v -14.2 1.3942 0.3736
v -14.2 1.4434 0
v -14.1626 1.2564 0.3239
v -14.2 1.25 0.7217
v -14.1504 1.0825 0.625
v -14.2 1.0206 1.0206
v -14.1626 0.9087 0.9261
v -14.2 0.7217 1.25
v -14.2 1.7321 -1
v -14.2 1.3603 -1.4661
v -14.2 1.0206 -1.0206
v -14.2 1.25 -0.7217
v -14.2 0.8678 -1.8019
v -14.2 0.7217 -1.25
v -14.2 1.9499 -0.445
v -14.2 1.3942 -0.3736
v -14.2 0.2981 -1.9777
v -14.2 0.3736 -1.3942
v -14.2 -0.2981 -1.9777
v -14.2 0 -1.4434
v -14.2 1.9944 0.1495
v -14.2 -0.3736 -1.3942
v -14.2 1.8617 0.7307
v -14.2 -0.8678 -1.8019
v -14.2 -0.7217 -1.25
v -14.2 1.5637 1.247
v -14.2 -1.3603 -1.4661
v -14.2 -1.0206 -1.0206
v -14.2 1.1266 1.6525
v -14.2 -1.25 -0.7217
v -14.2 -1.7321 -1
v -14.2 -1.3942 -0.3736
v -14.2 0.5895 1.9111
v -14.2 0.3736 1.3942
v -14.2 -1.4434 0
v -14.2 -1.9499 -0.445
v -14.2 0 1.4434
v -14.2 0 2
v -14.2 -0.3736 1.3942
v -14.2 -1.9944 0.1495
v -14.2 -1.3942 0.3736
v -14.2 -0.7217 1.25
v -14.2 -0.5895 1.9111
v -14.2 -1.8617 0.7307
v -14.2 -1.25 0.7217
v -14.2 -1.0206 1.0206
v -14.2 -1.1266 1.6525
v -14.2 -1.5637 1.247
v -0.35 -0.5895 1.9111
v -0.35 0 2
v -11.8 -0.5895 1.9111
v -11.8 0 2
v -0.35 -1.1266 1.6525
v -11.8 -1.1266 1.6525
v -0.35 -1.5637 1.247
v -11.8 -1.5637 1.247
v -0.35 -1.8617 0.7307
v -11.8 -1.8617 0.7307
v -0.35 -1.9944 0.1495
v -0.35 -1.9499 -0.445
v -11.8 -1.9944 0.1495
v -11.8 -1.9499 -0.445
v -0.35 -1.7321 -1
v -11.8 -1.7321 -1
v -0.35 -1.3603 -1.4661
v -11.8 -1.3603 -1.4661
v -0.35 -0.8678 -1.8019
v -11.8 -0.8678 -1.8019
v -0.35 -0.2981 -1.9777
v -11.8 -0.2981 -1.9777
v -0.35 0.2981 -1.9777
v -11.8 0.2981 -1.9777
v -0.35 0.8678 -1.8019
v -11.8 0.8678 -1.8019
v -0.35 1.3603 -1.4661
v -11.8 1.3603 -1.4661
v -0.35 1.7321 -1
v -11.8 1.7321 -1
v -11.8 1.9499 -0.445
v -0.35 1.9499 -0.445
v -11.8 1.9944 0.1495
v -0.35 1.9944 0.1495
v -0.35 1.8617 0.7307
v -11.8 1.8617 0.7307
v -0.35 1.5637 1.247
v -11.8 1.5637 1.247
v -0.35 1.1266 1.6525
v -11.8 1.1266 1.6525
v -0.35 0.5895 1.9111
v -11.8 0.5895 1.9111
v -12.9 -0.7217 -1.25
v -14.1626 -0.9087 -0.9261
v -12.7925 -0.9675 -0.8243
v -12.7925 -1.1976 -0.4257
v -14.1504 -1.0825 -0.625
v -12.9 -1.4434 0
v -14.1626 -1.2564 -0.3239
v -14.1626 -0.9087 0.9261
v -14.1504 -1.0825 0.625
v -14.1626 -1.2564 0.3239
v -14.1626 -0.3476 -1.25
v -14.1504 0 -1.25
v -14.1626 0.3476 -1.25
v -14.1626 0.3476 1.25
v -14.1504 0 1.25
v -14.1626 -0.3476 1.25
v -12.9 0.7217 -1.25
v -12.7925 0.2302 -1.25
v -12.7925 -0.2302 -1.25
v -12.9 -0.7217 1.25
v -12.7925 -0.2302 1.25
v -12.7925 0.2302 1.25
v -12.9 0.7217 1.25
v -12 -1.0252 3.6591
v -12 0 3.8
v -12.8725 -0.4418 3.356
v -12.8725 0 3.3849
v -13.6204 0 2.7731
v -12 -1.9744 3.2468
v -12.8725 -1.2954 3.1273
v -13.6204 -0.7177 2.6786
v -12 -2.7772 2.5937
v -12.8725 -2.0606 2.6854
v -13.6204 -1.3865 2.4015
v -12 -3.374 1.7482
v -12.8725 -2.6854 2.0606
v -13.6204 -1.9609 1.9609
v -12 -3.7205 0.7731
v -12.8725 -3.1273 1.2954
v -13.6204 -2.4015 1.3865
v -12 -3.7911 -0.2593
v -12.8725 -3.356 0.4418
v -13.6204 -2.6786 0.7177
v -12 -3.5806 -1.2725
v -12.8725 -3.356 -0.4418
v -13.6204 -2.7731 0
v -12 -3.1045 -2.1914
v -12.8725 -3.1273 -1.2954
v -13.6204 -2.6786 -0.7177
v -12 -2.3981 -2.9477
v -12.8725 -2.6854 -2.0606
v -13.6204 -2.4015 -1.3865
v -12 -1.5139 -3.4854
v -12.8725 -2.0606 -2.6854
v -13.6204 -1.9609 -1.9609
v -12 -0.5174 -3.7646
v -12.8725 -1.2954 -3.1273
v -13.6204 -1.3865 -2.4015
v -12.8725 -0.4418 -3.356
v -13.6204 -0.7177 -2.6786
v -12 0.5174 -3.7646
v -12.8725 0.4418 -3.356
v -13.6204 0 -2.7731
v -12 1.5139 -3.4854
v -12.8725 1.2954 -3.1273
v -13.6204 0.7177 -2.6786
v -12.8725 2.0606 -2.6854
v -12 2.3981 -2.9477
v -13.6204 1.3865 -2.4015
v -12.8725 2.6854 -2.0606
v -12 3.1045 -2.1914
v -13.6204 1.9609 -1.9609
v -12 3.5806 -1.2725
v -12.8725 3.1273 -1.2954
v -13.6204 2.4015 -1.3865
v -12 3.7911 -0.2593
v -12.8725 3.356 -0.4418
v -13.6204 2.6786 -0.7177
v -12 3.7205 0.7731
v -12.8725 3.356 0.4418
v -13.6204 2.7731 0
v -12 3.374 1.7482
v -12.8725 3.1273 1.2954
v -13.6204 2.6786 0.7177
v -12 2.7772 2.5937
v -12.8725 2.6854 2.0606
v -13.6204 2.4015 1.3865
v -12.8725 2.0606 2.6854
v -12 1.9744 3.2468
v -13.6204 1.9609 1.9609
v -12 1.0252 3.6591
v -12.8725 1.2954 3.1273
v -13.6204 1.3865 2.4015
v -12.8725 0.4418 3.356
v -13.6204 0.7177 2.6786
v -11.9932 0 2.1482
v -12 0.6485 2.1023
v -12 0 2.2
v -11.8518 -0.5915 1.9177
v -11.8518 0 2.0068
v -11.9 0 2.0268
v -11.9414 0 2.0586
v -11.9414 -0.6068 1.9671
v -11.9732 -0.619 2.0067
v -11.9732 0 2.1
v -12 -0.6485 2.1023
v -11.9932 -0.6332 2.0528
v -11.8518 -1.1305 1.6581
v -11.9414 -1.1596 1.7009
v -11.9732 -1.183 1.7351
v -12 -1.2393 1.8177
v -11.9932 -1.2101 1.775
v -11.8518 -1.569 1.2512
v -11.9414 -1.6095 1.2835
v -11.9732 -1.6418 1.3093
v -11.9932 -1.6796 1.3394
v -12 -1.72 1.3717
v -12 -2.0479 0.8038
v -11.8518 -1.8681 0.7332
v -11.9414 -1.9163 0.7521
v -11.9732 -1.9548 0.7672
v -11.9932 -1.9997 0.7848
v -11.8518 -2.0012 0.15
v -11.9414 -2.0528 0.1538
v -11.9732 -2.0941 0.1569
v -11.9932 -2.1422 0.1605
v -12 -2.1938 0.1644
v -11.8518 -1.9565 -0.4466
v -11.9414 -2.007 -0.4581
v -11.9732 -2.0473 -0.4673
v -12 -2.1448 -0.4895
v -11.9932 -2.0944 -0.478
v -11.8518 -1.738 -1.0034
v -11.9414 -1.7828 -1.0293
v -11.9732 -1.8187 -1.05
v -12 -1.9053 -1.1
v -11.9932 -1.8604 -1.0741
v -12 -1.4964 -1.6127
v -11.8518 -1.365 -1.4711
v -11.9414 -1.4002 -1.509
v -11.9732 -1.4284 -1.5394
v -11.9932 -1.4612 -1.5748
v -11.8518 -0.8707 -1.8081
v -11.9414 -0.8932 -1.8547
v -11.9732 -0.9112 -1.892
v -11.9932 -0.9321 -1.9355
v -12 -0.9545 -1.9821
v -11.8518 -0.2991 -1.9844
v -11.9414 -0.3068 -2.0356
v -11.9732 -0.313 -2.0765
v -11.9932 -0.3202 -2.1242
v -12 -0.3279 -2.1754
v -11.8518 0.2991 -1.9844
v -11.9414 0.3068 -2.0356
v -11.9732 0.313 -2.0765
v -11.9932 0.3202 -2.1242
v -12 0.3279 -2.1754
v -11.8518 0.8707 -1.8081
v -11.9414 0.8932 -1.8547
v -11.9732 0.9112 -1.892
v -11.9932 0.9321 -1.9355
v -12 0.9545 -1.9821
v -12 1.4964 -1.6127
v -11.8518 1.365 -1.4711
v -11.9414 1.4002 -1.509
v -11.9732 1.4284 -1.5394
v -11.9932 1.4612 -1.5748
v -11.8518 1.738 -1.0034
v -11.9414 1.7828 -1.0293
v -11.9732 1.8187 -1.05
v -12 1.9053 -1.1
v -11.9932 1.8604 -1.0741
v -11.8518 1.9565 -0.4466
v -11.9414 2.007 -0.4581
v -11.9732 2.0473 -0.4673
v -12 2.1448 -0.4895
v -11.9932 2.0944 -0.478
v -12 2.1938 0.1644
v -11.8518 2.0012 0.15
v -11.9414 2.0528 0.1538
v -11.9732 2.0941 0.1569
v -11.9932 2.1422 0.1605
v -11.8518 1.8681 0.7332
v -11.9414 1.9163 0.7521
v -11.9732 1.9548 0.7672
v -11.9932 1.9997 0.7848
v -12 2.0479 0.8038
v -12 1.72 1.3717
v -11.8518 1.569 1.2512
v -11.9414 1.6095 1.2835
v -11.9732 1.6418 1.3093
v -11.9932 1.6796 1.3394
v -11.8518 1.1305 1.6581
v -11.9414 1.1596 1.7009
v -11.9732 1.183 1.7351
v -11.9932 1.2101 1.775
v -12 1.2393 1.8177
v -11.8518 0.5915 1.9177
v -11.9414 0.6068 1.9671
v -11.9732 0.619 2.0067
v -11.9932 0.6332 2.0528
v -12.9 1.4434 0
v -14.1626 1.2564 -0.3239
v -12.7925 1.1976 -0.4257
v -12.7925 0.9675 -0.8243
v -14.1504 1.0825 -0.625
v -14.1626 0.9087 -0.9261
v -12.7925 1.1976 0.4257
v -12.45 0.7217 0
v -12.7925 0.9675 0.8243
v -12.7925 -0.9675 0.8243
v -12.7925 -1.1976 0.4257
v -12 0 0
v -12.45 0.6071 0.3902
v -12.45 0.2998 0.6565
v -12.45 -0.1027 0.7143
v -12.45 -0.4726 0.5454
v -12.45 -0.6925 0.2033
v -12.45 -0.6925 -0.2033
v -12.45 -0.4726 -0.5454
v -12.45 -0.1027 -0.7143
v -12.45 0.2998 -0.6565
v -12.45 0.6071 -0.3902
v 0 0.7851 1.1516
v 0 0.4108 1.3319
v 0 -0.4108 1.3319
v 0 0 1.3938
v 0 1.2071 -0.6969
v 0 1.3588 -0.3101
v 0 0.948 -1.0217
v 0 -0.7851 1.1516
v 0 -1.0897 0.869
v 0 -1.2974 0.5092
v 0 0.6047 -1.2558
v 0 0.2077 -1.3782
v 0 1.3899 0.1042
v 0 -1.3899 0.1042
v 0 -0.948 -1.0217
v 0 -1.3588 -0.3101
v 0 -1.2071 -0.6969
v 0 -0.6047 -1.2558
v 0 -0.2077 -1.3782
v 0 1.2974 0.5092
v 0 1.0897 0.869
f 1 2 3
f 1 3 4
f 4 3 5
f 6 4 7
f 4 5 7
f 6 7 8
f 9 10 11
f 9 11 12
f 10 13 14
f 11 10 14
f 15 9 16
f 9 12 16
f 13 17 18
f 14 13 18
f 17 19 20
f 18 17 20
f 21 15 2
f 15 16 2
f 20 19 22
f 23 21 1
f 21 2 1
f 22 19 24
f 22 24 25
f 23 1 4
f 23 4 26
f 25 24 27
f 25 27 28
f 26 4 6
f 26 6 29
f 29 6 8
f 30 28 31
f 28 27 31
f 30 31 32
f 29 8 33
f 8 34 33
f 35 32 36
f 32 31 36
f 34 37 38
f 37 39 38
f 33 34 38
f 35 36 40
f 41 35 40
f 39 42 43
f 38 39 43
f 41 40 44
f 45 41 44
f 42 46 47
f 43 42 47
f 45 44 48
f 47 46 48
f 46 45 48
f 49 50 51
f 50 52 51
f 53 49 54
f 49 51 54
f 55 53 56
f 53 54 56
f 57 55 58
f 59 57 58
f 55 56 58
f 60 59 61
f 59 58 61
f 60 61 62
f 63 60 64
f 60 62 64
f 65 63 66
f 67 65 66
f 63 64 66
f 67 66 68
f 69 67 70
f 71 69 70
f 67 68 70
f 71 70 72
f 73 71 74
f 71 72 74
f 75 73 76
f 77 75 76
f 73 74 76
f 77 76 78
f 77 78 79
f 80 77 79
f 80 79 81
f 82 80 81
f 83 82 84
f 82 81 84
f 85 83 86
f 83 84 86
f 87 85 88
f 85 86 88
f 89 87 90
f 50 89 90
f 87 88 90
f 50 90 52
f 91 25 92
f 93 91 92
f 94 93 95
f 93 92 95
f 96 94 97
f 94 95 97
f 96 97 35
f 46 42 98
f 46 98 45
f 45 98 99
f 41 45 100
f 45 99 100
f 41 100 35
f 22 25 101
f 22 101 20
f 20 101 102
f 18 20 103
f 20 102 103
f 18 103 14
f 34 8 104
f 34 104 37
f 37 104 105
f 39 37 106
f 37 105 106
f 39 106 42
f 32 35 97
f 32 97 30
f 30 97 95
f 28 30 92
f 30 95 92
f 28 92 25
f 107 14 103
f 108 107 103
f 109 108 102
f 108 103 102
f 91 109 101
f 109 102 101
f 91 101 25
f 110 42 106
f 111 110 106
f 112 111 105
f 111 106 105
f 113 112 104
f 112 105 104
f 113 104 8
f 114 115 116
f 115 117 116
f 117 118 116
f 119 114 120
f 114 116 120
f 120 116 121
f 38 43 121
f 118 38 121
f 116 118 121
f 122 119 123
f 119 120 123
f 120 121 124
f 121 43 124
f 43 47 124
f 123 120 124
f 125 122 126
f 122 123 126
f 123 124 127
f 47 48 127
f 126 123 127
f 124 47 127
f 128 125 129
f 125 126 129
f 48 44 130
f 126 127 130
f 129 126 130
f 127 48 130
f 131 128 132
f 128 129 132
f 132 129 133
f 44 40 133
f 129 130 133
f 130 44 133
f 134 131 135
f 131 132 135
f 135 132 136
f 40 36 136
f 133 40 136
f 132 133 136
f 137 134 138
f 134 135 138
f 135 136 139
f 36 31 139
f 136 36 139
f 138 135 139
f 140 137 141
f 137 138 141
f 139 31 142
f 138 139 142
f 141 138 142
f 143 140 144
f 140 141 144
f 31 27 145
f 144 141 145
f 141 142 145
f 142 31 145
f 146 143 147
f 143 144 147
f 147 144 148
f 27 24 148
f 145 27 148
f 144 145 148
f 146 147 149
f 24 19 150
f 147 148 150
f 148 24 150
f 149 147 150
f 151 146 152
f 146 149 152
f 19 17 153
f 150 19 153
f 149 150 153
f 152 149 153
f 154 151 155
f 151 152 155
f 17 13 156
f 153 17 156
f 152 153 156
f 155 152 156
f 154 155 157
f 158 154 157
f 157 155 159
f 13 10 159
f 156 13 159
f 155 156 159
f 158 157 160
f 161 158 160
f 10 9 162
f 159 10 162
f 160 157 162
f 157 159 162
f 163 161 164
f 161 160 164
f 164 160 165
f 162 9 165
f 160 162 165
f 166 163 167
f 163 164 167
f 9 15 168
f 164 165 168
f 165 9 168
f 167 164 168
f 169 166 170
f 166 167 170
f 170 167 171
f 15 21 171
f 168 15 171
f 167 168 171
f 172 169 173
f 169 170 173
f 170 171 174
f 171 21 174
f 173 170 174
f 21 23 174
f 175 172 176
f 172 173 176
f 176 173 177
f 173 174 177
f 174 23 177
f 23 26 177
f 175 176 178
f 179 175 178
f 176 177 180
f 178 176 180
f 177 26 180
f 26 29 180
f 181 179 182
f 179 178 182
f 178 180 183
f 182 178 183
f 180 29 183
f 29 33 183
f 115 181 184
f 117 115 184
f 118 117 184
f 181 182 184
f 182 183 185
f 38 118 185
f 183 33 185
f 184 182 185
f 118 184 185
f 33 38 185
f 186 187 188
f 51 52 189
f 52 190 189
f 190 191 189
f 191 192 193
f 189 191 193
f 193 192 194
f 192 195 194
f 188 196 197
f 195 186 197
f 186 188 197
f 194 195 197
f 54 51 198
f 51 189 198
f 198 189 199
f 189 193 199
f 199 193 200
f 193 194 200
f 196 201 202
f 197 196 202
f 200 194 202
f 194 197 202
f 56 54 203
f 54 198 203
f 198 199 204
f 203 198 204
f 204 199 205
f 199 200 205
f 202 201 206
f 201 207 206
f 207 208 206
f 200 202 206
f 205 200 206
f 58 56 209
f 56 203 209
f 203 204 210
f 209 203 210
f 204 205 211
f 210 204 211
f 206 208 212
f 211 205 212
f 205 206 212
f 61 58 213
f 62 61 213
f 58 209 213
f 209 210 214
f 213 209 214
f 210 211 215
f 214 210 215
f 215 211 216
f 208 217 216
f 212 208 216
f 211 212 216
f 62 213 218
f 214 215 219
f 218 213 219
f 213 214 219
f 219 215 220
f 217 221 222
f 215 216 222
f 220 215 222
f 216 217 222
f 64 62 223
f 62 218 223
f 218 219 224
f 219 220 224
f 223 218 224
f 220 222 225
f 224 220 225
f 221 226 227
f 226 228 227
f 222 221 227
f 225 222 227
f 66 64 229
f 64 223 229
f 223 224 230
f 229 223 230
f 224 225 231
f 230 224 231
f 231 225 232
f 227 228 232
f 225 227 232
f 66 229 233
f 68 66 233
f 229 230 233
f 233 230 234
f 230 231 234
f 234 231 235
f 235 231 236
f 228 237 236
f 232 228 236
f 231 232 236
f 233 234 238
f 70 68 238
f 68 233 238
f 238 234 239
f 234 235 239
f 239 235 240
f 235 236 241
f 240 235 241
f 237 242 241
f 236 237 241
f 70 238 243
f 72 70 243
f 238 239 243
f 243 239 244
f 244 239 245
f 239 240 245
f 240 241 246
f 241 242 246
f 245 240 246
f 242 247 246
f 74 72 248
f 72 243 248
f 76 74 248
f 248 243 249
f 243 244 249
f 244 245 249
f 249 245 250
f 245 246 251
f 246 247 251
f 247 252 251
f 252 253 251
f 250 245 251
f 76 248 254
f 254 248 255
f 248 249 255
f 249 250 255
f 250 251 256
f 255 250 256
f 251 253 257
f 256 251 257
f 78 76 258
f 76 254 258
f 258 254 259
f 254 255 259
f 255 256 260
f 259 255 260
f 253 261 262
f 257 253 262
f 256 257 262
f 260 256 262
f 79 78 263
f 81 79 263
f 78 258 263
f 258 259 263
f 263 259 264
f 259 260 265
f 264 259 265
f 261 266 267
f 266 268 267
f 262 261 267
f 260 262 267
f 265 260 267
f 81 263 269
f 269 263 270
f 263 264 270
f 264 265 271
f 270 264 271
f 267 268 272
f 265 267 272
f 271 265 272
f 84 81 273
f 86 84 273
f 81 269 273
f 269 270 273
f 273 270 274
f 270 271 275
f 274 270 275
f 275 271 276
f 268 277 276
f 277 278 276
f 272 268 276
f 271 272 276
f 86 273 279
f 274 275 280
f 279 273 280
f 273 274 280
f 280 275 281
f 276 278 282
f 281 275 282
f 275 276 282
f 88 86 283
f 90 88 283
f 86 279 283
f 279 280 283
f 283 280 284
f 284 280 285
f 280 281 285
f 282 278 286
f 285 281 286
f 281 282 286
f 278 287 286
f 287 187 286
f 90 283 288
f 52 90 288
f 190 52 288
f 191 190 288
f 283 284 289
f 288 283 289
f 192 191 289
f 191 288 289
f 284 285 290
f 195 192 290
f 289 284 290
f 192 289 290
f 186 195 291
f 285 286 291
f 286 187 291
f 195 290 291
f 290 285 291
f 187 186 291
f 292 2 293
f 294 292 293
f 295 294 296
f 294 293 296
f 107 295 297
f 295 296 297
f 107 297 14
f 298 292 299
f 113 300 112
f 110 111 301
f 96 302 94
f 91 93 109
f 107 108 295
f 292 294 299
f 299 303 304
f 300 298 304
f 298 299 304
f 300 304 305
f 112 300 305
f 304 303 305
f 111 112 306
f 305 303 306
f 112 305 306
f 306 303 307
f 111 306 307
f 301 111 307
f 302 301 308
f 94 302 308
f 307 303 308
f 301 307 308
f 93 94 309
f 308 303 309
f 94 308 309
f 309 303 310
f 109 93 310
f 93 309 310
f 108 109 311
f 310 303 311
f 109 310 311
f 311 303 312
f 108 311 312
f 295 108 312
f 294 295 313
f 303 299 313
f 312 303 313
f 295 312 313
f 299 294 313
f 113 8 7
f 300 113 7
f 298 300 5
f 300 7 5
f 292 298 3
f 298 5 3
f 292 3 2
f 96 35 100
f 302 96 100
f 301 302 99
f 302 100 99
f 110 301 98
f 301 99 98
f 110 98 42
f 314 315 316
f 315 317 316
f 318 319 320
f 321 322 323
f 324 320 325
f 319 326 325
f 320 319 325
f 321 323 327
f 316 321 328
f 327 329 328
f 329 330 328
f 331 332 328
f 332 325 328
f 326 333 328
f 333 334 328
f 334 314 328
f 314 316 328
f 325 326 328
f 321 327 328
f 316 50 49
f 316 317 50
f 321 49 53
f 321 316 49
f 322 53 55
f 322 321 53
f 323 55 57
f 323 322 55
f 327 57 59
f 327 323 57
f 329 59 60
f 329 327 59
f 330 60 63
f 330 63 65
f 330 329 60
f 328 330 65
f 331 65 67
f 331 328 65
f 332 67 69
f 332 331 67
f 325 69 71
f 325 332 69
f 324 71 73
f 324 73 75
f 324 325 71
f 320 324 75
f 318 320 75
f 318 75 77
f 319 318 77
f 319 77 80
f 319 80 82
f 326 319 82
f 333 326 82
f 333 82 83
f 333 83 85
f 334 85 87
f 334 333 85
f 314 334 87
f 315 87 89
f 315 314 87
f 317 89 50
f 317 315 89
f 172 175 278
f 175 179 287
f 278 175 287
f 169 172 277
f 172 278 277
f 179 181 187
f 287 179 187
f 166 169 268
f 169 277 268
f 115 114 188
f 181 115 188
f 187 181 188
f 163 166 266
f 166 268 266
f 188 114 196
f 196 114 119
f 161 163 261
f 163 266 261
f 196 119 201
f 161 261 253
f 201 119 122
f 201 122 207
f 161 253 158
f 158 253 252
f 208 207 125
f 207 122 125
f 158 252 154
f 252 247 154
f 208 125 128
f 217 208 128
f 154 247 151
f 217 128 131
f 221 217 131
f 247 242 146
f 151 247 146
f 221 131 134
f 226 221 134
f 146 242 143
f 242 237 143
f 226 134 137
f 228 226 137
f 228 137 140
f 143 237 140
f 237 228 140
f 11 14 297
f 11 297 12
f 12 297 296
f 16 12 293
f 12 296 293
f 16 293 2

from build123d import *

# Parameters (mm, degrees)
CUT_EXTRUDE_1_DEPTH = 2.2


with BuildPart() as part:
    # 草图1 → 旋转1 (revolve)
    with BuildSketch(Plane.XY):
        with BuildLine():
            Line((0, 2), (-11.8, 2))
            ThreePointArc((-11.8, 2), (-11.941421356, 2.058578644), (-12, 2.2))
            Line((-12, 2.2), (-12, 3.8))
            ThreePointArc((-12, 3.8), (-13.264955669, 3.101612484), (-14.2, 2))
            Line((-14.2, 2), (-14.2, 0))
            Line((-14.2, 0), (0, 0))
            Line((0, 0), (0, 2))
        make_face()
    revolve(axis=Axis((-14.2, 0, 0), (1, 0, 0)))

    # 草图2 → 切除-拉伸1 (cut)
    with BuildSketch(Plane.ZY.offset(14.2)):
        Polygon((0, 1.443375673), (-1.25, 0.721687836), (-1.25, -0.721687836), (0, -1.443375673), (1.25, -0.721687836), (1.25, 0.721687836), align=None)
    extrude(amount=-CUT_EXTRUDE_1_DEPTH, mode=Mode.SUBTRACT)

    # 草图6 → 旋转2 (revolve)
    with BuildSketch(Plane.XY):
        Polygon((-12.9, 1.443375673), (-12, 0), (-11.63, 0), (-11.63, 1.443375673), align=None)
    revolve(axis=Axis((-14.2, 0, 0), (1, 0, 0)))

    # 草图7 → 切除-旋转5 (revolve, cut)
    with BuildSketch(Plane.XY):
        Polygon((-14.2, 1.443375673), (-13.83, 0), (-14.2, 0), align=None)
    revolve(axis=Axis((-14.2, 0, 0), (1, 0, 0)), mode=Mode.SUBTRACT)

    # 草图4 → 切除-旋转1 (revolve, cut)
    with BuildSketch(Plane.XY):
        Polygon((-0.35, 2), (0, 1.393782217), (0.35, 2), align=None)
    revolve(axis=Axis((-0.35, 0, 0), (1, 0, 0)), mode=Mode.SUBTRACT)


solid = part.part
